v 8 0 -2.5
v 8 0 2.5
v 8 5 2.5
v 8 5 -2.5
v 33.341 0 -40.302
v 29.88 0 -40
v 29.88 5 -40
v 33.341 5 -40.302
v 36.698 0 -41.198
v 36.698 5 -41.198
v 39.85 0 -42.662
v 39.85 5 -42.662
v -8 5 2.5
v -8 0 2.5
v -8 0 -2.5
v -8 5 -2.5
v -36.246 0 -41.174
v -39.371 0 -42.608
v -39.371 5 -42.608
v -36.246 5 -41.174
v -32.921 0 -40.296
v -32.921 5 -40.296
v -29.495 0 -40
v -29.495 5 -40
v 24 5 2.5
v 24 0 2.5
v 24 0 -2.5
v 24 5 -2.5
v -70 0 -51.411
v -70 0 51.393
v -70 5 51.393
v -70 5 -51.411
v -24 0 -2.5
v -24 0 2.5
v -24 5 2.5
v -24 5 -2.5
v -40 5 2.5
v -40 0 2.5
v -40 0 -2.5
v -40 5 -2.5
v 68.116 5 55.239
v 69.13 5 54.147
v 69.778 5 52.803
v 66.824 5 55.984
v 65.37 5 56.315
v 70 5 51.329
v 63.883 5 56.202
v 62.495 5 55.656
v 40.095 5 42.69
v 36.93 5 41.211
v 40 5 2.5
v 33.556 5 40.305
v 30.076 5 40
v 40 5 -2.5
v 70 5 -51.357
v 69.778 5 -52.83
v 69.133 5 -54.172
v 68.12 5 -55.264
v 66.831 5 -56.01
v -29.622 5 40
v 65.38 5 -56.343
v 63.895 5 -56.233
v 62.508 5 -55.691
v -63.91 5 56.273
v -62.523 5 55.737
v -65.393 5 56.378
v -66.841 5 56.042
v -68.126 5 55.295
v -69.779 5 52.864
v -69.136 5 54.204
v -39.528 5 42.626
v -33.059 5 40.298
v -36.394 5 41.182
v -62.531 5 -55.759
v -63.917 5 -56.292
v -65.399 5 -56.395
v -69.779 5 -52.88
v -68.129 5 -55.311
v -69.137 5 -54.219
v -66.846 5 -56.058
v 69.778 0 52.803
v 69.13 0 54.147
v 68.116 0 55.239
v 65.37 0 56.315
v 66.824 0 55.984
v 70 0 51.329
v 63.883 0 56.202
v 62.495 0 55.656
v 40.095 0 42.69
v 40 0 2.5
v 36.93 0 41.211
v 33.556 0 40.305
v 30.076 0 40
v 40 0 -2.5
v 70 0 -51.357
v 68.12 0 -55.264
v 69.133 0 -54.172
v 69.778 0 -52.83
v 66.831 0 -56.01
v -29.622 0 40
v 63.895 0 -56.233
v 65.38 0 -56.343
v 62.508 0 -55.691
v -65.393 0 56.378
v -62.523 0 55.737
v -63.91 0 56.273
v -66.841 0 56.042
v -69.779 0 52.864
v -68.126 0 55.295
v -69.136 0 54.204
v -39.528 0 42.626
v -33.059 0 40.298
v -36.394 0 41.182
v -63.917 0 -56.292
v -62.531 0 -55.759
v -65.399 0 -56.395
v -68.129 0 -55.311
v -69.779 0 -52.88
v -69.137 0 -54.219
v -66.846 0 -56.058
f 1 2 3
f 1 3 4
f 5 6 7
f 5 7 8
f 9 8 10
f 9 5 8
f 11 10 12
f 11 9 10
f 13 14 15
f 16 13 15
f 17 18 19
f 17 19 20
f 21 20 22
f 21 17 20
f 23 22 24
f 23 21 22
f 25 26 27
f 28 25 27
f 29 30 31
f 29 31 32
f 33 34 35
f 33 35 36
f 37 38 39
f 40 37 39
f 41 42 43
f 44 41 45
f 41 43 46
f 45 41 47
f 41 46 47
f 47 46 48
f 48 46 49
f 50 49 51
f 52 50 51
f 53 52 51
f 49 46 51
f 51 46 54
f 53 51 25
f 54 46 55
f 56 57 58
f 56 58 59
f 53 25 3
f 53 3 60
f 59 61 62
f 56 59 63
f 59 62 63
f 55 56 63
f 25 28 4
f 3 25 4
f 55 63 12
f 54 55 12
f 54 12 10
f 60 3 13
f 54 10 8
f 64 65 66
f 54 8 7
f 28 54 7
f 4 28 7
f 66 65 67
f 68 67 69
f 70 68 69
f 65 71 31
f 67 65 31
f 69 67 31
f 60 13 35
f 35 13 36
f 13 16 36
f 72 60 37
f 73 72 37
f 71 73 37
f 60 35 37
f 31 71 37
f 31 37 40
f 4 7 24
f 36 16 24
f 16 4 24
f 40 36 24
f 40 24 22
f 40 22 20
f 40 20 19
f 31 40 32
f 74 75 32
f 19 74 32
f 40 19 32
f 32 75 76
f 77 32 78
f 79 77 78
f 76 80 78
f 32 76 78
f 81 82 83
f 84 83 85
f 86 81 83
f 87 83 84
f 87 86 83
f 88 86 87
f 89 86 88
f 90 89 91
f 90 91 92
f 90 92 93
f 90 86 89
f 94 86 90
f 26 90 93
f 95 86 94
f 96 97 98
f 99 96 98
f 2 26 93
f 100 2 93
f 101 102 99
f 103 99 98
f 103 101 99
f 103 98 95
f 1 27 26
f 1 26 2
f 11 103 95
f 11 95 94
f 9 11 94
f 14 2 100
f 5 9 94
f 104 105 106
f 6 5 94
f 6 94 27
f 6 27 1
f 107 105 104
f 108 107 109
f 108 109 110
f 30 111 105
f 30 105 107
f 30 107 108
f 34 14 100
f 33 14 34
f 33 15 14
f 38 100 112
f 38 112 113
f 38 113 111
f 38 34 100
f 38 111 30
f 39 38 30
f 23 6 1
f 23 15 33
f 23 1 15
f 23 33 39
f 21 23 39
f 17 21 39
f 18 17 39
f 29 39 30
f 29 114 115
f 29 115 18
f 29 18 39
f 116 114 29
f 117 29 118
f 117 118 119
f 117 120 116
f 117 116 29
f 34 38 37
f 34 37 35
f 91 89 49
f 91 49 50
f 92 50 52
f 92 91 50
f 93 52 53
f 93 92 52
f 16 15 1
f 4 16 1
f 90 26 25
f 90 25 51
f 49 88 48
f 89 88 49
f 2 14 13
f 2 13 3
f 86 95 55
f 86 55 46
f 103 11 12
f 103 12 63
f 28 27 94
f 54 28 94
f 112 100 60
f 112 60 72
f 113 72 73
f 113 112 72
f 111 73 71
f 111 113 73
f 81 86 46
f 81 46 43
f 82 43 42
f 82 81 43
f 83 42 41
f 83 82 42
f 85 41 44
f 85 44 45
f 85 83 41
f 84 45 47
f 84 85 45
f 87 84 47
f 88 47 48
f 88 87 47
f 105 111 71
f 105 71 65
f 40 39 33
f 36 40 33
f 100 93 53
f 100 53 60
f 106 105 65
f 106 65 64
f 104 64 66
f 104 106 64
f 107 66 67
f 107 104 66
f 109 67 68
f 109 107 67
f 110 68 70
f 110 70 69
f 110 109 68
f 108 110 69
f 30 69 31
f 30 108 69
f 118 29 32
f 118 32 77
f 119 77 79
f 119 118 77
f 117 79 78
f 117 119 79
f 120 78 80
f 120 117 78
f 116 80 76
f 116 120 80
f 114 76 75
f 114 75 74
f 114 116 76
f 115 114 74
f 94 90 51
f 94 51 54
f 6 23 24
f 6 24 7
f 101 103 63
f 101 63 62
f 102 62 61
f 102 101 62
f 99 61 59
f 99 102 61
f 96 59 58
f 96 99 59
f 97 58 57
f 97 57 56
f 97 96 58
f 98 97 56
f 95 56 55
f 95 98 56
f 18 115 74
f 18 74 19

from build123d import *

# Parameters (mm, degrees)
SKETCH1_W           = 16
SKETCH1_H           = 5
BOSS_EXTRUDE1_DEPTH = 5


with BuildPart() as part:
    # Sketch1 → Boss-Extrude1 (new body)
    with BuildSketch(Plane(origin=(0, 0, 0), x_dir=(1, 0, 0), z_dir=(0, 1, 0))):
        with BuildLine():
            Line((-29.495397245, 40), (29.879619523, 40))
            ThreePointArc((29.879619523, 40), (35.039273824, 40.677009354), (39.849614703, 42.662203251))
            Line((39.849614703, 42.662203251), (62.507501205, 55.691483874))
            ThreePointArc((62.507501205, 55.691483874), (67.503747793, 55.684995753), (70, 51.357034687))
            Line((70, 51.357034687), (70, -51.328756138))
            ThreePointArc((70, -51.328756138), (67.497622519, -55.660254926), (62.495247299, -55.656135704))
            Line((62.495247299, -55.656135704), (40.094909722, -42.690481736))
            ThreePointArc((40.094909722, -42.690481736), (35.262884302, -40.684328056), (30.075898919, -40))
            Line((30.075898919, -40), (-29.621741739, -40))
            ThreePointArc((-29.621741739, -40), (-34.74594239, -40.667577294), (-39.528063042, -42.625743232))
            Line((-39.528063042, -42.625743232), (-62.523419674, -55.737060414))
            ThreePointArc((-62.523419674, -55.737060414), (-67.511682541, -55.716857277), (-70, -51.393496222))
            Line((-70, -51.393496222), (-70, 51.411080519))
            ThreePointArc((-70, 51.411080519), (-67.515524189, 55.732207462), (-62.531144779, 55.759040259))
            Line((-62.531144779, 55.759040259), (-39.370818131, 42.608161042))
            ThreePointArc((-39.370818131, 42.608161042), (-34.602413049, 40.663030497), (-29.495397245, 40))
        make_face()
        Rectangle(SKETCH1_W, SKETCH1_H, mode=Mode.SUBTRACT)
        with Locations((-32, 0)):
            Rectangle(SKETCH1_W, SKETCH1_H, mode=Mode.SUBTRACT)
        with Locations((32, 0)):
            Rectangle(SKETCH1_W, SKETCH1_H, mode=Mode.SUBTRACT)
    extrude(amount=BOSS_EXTRUDE1_DEPTH)


solid = part.part
